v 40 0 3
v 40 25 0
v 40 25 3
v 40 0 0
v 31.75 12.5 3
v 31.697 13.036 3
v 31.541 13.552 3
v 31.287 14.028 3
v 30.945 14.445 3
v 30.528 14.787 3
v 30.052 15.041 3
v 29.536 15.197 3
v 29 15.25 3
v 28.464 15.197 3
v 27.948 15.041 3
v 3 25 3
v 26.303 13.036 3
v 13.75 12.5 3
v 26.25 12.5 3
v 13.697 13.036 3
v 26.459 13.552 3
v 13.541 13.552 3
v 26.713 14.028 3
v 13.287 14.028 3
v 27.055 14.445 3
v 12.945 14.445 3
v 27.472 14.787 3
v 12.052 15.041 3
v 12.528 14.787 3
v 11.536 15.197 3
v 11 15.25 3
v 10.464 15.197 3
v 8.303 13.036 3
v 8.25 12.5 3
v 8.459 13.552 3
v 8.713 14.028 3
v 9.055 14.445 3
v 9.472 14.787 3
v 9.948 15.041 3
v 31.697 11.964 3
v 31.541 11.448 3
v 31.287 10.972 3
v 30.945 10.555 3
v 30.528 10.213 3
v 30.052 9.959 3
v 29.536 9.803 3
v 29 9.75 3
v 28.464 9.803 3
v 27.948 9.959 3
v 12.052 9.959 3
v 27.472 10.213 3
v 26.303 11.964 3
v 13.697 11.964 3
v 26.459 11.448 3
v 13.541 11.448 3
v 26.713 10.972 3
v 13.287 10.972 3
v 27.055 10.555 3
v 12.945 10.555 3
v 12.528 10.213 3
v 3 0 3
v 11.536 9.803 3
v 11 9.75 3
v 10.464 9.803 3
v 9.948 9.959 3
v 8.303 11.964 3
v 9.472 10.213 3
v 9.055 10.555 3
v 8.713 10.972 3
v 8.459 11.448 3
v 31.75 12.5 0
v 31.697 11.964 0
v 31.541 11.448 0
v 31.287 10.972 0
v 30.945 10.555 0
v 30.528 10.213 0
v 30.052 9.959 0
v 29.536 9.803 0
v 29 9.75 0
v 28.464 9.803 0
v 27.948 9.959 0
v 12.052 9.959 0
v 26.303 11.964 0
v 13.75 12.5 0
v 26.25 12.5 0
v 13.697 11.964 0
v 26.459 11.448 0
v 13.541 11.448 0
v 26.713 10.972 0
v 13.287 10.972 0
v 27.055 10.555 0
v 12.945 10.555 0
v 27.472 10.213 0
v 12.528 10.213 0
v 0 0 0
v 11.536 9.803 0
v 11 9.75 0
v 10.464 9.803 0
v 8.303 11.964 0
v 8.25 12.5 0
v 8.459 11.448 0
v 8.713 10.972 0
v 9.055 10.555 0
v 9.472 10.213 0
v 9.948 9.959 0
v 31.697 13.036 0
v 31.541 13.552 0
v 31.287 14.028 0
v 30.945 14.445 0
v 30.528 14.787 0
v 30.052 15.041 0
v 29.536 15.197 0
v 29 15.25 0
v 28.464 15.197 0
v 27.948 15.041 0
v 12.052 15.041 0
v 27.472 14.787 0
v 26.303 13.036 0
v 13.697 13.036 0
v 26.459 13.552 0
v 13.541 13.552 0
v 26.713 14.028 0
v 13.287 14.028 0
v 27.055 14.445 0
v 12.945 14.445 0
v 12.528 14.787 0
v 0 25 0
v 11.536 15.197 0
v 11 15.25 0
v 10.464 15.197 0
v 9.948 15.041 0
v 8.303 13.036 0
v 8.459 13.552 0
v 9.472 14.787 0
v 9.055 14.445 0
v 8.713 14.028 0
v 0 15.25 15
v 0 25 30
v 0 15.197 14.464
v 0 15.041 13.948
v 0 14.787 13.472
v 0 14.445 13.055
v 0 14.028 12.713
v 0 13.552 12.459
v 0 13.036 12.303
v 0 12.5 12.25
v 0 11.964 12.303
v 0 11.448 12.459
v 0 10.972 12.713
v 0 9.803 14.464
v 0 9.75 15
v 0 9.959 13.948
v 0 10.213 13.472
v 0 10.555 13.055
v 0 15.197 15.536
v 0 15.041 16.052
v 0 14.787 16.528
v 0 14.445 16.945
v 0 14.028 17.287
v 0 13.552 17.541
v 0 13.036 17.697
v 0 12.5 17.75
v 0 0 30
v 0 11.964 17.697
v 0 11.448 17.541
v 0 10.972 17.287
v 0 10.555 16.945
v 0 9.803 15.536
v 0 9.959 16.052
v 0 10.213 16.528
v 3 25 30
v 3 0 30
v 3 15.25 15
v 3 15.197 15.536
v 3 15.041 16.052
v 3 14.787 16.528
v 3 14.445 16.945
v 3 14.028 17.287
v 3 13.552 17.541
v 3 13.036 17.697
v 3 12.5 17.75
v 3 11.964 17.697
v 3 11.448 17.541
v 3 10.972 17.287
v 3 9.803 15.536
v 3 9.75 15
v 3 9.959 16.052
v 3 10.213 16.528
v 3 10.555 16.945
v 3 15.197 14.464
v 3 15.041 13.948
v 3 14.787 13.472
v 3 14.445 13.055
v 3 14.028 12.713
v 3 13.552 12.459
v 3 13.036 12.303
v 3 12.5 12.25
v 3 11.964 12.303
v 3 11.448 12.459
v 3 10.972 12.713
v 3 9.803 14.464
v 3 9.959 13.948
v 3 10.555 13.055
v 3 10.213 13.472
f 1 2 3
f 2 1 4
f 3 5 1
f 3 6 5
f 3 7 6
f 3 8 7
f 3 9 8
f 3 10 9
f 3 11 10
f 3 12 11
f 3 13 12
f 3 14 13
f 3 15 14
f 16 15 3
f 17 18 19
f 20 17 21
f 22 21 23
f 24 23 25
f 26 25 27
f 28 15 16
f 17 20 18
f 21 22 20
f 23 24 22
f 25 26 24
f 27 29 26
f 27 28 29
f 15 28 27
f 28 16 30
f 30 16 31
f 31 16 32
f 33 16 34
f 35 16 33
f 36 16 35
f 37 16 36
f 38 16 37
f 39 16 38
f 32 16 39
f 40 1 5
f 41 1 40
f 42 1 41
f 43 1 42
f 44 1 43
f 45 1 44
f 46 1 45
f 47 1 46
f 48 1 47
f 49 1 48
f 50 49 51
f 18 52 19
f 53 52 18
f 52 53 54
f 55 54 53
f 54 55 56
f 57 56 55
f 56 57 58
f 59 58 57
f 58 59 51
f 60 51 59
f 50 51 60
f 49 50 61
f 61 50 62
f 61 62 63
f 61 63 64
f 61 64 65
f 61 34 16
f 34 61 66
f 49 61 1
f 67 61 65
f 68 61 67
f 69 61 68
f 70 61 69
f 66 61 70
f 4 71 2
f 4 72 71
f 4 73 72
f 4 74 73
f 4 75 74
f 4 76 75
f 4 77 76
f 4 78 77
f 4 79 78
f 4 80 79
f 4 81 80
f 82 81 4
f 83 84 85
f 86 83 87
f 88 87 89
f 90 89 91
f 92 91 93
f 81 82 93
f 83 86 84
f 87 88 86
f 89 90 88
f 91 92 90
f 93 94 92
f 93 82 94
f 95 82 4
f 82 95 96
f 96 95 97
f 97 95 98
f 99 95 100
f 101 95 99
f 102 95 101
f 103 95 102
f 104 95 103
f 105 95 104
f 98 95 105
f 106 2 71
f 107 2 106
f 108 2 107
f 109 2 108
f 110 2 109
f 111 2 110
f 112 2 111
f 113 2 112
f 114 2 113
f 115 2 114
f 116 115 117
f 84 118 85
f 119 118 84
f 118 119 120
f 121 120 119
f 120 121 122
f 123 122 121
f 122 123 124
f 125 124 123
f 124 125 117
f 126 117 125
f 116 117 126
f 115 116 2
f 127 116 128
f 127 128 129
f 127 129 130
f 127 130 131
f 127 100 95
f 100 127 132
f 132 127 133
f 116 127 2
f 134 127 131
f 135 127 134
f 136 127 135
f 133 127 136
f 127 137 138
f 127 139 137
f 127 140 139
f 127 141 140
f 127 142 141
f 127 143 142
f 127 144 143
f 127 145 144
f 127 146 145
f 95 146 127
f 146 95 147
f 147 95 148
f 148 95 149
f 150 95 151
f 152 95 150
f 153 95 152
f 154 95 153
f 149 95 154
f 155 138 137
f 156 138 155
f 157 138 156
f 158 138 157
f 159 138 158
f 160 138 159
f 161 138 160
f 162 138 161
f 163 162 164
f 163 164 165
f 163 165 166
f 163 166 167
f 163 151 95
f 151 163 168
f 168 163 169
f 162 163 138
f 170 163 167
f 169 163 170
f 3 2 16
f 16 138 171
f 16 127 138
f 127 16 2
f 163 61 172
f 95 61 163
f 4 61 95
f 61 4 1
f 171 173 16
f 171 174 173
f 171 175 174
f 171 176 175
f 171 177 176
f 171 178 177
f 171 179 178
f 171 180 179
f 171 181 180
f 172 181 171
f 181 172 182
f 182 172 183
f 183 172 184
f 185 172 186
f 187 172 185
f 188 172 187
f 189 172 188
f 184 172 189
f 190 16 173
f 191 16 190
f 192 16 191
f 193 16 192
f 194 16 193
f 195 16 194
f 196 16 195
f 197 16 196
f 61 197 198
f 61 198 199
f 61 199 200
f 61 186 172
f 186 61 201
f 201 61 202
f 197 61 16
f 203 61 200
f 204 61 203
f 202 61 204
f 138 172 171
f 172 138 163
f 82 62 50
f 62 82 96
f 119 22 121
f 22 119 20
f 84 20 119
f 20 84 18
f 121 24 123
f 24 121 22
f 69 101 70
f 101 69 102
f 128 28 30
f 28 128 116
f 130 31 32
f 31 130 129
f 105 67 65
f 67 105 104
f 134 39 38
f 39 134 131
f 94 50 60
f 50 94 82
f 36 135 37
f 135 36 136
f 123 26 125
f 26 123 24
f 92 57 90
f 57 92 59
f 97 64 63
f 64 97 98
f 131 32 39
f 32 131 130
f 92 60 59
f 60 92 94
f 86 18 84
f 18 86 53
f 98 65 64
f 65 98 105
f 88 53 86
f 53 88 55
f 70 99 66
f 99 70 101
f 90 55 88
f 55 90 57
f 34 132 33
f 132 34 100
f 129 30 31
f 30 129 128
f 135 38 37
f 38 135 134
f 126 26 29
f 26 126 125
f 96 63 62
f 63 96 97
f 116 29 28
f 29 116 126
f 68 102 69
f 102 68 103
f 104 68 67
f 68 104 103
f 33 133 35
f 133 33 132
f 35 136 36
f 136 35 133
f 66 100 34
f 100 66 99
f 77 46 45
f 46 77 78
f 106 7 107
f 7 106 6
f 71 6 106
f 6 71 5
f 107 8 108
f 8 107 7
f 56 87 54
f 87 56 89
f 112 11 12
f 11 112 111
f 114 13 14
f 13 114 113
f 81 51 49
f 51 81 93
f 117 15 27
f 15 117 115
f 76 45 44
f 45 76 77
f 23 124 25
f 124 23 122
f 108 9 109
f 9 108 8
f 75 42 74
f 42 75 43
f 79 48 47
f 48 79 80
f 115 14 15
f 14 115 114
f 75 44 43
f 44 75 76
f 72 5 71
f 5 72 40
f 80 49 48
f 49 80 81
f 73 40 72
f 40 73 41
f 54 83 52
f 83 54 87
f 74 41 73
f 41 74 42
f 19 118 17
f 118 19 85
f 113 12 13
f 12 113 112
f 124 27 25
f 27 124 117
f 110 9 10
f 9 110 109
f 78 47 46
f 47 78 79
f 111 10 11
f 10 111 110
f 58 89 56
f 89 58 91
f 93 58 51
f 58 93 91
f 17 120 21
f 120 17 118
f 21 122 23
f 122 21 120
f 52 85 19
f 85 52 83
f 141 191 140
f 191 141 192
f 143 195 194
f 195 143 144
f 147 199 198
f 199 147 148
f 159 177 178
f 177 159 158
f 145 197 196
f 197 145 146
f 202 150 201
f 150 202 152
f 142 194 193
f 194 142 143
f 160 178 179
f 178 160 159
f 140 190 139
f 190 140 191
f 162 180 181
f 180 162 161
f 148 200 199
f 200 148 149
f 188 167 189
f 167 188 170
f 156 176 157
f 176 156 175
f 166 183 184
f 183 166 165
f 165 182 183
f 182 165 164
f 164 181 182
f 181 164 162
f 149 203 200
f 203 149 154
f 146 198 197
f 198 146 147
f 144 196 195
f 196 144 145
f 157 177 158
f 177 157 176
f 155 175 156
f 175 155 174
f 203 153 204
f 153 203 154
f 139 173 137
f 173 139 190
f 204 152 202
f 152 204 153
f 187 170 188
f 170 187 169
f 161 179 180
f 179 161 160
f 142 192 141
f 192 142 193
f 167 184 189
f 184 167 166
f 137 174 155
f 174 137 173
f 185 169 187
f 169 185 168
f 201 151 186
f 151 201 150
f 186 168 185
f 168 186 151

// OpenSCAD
$fn = 32;

// ----------------------------------------------------------------------
// L-bracket: 40 x 25 x 30 mm
// ----------------------------------------------------------------------

// --- parameters (mm) ---
base_len = 40;            // horizontal leg, X
upright_h = 30;           // vertical leg, Z
flange_w = 25;            // bracket depth, Y
mat_t = 3;                // plate thickness
hole_d = 5.5;             // clearance for M5

module hole_z(px, py) {
  translate([px, py, -0.5]) cylinder(h = mat_t + 1, d = hole_d);
}
module hole_x(pz, py) {
  translate([-0.5, py, pz]) rotate([0, 90, 0]) cylinder(h = mat_t + 1, d = hole_d);
}

difference() {
  union() {
    /* horizontal leg */
    cube([base_len, flange_w, mat_t]);
    /* vertical leg, overlapping the corner block */
    cube([mat_t, flange_w, upright_h]);
  }
  hole_z(11, 12.5);
  hole_z(29, 12.5);
  hole_x(15, 12.5);
}
